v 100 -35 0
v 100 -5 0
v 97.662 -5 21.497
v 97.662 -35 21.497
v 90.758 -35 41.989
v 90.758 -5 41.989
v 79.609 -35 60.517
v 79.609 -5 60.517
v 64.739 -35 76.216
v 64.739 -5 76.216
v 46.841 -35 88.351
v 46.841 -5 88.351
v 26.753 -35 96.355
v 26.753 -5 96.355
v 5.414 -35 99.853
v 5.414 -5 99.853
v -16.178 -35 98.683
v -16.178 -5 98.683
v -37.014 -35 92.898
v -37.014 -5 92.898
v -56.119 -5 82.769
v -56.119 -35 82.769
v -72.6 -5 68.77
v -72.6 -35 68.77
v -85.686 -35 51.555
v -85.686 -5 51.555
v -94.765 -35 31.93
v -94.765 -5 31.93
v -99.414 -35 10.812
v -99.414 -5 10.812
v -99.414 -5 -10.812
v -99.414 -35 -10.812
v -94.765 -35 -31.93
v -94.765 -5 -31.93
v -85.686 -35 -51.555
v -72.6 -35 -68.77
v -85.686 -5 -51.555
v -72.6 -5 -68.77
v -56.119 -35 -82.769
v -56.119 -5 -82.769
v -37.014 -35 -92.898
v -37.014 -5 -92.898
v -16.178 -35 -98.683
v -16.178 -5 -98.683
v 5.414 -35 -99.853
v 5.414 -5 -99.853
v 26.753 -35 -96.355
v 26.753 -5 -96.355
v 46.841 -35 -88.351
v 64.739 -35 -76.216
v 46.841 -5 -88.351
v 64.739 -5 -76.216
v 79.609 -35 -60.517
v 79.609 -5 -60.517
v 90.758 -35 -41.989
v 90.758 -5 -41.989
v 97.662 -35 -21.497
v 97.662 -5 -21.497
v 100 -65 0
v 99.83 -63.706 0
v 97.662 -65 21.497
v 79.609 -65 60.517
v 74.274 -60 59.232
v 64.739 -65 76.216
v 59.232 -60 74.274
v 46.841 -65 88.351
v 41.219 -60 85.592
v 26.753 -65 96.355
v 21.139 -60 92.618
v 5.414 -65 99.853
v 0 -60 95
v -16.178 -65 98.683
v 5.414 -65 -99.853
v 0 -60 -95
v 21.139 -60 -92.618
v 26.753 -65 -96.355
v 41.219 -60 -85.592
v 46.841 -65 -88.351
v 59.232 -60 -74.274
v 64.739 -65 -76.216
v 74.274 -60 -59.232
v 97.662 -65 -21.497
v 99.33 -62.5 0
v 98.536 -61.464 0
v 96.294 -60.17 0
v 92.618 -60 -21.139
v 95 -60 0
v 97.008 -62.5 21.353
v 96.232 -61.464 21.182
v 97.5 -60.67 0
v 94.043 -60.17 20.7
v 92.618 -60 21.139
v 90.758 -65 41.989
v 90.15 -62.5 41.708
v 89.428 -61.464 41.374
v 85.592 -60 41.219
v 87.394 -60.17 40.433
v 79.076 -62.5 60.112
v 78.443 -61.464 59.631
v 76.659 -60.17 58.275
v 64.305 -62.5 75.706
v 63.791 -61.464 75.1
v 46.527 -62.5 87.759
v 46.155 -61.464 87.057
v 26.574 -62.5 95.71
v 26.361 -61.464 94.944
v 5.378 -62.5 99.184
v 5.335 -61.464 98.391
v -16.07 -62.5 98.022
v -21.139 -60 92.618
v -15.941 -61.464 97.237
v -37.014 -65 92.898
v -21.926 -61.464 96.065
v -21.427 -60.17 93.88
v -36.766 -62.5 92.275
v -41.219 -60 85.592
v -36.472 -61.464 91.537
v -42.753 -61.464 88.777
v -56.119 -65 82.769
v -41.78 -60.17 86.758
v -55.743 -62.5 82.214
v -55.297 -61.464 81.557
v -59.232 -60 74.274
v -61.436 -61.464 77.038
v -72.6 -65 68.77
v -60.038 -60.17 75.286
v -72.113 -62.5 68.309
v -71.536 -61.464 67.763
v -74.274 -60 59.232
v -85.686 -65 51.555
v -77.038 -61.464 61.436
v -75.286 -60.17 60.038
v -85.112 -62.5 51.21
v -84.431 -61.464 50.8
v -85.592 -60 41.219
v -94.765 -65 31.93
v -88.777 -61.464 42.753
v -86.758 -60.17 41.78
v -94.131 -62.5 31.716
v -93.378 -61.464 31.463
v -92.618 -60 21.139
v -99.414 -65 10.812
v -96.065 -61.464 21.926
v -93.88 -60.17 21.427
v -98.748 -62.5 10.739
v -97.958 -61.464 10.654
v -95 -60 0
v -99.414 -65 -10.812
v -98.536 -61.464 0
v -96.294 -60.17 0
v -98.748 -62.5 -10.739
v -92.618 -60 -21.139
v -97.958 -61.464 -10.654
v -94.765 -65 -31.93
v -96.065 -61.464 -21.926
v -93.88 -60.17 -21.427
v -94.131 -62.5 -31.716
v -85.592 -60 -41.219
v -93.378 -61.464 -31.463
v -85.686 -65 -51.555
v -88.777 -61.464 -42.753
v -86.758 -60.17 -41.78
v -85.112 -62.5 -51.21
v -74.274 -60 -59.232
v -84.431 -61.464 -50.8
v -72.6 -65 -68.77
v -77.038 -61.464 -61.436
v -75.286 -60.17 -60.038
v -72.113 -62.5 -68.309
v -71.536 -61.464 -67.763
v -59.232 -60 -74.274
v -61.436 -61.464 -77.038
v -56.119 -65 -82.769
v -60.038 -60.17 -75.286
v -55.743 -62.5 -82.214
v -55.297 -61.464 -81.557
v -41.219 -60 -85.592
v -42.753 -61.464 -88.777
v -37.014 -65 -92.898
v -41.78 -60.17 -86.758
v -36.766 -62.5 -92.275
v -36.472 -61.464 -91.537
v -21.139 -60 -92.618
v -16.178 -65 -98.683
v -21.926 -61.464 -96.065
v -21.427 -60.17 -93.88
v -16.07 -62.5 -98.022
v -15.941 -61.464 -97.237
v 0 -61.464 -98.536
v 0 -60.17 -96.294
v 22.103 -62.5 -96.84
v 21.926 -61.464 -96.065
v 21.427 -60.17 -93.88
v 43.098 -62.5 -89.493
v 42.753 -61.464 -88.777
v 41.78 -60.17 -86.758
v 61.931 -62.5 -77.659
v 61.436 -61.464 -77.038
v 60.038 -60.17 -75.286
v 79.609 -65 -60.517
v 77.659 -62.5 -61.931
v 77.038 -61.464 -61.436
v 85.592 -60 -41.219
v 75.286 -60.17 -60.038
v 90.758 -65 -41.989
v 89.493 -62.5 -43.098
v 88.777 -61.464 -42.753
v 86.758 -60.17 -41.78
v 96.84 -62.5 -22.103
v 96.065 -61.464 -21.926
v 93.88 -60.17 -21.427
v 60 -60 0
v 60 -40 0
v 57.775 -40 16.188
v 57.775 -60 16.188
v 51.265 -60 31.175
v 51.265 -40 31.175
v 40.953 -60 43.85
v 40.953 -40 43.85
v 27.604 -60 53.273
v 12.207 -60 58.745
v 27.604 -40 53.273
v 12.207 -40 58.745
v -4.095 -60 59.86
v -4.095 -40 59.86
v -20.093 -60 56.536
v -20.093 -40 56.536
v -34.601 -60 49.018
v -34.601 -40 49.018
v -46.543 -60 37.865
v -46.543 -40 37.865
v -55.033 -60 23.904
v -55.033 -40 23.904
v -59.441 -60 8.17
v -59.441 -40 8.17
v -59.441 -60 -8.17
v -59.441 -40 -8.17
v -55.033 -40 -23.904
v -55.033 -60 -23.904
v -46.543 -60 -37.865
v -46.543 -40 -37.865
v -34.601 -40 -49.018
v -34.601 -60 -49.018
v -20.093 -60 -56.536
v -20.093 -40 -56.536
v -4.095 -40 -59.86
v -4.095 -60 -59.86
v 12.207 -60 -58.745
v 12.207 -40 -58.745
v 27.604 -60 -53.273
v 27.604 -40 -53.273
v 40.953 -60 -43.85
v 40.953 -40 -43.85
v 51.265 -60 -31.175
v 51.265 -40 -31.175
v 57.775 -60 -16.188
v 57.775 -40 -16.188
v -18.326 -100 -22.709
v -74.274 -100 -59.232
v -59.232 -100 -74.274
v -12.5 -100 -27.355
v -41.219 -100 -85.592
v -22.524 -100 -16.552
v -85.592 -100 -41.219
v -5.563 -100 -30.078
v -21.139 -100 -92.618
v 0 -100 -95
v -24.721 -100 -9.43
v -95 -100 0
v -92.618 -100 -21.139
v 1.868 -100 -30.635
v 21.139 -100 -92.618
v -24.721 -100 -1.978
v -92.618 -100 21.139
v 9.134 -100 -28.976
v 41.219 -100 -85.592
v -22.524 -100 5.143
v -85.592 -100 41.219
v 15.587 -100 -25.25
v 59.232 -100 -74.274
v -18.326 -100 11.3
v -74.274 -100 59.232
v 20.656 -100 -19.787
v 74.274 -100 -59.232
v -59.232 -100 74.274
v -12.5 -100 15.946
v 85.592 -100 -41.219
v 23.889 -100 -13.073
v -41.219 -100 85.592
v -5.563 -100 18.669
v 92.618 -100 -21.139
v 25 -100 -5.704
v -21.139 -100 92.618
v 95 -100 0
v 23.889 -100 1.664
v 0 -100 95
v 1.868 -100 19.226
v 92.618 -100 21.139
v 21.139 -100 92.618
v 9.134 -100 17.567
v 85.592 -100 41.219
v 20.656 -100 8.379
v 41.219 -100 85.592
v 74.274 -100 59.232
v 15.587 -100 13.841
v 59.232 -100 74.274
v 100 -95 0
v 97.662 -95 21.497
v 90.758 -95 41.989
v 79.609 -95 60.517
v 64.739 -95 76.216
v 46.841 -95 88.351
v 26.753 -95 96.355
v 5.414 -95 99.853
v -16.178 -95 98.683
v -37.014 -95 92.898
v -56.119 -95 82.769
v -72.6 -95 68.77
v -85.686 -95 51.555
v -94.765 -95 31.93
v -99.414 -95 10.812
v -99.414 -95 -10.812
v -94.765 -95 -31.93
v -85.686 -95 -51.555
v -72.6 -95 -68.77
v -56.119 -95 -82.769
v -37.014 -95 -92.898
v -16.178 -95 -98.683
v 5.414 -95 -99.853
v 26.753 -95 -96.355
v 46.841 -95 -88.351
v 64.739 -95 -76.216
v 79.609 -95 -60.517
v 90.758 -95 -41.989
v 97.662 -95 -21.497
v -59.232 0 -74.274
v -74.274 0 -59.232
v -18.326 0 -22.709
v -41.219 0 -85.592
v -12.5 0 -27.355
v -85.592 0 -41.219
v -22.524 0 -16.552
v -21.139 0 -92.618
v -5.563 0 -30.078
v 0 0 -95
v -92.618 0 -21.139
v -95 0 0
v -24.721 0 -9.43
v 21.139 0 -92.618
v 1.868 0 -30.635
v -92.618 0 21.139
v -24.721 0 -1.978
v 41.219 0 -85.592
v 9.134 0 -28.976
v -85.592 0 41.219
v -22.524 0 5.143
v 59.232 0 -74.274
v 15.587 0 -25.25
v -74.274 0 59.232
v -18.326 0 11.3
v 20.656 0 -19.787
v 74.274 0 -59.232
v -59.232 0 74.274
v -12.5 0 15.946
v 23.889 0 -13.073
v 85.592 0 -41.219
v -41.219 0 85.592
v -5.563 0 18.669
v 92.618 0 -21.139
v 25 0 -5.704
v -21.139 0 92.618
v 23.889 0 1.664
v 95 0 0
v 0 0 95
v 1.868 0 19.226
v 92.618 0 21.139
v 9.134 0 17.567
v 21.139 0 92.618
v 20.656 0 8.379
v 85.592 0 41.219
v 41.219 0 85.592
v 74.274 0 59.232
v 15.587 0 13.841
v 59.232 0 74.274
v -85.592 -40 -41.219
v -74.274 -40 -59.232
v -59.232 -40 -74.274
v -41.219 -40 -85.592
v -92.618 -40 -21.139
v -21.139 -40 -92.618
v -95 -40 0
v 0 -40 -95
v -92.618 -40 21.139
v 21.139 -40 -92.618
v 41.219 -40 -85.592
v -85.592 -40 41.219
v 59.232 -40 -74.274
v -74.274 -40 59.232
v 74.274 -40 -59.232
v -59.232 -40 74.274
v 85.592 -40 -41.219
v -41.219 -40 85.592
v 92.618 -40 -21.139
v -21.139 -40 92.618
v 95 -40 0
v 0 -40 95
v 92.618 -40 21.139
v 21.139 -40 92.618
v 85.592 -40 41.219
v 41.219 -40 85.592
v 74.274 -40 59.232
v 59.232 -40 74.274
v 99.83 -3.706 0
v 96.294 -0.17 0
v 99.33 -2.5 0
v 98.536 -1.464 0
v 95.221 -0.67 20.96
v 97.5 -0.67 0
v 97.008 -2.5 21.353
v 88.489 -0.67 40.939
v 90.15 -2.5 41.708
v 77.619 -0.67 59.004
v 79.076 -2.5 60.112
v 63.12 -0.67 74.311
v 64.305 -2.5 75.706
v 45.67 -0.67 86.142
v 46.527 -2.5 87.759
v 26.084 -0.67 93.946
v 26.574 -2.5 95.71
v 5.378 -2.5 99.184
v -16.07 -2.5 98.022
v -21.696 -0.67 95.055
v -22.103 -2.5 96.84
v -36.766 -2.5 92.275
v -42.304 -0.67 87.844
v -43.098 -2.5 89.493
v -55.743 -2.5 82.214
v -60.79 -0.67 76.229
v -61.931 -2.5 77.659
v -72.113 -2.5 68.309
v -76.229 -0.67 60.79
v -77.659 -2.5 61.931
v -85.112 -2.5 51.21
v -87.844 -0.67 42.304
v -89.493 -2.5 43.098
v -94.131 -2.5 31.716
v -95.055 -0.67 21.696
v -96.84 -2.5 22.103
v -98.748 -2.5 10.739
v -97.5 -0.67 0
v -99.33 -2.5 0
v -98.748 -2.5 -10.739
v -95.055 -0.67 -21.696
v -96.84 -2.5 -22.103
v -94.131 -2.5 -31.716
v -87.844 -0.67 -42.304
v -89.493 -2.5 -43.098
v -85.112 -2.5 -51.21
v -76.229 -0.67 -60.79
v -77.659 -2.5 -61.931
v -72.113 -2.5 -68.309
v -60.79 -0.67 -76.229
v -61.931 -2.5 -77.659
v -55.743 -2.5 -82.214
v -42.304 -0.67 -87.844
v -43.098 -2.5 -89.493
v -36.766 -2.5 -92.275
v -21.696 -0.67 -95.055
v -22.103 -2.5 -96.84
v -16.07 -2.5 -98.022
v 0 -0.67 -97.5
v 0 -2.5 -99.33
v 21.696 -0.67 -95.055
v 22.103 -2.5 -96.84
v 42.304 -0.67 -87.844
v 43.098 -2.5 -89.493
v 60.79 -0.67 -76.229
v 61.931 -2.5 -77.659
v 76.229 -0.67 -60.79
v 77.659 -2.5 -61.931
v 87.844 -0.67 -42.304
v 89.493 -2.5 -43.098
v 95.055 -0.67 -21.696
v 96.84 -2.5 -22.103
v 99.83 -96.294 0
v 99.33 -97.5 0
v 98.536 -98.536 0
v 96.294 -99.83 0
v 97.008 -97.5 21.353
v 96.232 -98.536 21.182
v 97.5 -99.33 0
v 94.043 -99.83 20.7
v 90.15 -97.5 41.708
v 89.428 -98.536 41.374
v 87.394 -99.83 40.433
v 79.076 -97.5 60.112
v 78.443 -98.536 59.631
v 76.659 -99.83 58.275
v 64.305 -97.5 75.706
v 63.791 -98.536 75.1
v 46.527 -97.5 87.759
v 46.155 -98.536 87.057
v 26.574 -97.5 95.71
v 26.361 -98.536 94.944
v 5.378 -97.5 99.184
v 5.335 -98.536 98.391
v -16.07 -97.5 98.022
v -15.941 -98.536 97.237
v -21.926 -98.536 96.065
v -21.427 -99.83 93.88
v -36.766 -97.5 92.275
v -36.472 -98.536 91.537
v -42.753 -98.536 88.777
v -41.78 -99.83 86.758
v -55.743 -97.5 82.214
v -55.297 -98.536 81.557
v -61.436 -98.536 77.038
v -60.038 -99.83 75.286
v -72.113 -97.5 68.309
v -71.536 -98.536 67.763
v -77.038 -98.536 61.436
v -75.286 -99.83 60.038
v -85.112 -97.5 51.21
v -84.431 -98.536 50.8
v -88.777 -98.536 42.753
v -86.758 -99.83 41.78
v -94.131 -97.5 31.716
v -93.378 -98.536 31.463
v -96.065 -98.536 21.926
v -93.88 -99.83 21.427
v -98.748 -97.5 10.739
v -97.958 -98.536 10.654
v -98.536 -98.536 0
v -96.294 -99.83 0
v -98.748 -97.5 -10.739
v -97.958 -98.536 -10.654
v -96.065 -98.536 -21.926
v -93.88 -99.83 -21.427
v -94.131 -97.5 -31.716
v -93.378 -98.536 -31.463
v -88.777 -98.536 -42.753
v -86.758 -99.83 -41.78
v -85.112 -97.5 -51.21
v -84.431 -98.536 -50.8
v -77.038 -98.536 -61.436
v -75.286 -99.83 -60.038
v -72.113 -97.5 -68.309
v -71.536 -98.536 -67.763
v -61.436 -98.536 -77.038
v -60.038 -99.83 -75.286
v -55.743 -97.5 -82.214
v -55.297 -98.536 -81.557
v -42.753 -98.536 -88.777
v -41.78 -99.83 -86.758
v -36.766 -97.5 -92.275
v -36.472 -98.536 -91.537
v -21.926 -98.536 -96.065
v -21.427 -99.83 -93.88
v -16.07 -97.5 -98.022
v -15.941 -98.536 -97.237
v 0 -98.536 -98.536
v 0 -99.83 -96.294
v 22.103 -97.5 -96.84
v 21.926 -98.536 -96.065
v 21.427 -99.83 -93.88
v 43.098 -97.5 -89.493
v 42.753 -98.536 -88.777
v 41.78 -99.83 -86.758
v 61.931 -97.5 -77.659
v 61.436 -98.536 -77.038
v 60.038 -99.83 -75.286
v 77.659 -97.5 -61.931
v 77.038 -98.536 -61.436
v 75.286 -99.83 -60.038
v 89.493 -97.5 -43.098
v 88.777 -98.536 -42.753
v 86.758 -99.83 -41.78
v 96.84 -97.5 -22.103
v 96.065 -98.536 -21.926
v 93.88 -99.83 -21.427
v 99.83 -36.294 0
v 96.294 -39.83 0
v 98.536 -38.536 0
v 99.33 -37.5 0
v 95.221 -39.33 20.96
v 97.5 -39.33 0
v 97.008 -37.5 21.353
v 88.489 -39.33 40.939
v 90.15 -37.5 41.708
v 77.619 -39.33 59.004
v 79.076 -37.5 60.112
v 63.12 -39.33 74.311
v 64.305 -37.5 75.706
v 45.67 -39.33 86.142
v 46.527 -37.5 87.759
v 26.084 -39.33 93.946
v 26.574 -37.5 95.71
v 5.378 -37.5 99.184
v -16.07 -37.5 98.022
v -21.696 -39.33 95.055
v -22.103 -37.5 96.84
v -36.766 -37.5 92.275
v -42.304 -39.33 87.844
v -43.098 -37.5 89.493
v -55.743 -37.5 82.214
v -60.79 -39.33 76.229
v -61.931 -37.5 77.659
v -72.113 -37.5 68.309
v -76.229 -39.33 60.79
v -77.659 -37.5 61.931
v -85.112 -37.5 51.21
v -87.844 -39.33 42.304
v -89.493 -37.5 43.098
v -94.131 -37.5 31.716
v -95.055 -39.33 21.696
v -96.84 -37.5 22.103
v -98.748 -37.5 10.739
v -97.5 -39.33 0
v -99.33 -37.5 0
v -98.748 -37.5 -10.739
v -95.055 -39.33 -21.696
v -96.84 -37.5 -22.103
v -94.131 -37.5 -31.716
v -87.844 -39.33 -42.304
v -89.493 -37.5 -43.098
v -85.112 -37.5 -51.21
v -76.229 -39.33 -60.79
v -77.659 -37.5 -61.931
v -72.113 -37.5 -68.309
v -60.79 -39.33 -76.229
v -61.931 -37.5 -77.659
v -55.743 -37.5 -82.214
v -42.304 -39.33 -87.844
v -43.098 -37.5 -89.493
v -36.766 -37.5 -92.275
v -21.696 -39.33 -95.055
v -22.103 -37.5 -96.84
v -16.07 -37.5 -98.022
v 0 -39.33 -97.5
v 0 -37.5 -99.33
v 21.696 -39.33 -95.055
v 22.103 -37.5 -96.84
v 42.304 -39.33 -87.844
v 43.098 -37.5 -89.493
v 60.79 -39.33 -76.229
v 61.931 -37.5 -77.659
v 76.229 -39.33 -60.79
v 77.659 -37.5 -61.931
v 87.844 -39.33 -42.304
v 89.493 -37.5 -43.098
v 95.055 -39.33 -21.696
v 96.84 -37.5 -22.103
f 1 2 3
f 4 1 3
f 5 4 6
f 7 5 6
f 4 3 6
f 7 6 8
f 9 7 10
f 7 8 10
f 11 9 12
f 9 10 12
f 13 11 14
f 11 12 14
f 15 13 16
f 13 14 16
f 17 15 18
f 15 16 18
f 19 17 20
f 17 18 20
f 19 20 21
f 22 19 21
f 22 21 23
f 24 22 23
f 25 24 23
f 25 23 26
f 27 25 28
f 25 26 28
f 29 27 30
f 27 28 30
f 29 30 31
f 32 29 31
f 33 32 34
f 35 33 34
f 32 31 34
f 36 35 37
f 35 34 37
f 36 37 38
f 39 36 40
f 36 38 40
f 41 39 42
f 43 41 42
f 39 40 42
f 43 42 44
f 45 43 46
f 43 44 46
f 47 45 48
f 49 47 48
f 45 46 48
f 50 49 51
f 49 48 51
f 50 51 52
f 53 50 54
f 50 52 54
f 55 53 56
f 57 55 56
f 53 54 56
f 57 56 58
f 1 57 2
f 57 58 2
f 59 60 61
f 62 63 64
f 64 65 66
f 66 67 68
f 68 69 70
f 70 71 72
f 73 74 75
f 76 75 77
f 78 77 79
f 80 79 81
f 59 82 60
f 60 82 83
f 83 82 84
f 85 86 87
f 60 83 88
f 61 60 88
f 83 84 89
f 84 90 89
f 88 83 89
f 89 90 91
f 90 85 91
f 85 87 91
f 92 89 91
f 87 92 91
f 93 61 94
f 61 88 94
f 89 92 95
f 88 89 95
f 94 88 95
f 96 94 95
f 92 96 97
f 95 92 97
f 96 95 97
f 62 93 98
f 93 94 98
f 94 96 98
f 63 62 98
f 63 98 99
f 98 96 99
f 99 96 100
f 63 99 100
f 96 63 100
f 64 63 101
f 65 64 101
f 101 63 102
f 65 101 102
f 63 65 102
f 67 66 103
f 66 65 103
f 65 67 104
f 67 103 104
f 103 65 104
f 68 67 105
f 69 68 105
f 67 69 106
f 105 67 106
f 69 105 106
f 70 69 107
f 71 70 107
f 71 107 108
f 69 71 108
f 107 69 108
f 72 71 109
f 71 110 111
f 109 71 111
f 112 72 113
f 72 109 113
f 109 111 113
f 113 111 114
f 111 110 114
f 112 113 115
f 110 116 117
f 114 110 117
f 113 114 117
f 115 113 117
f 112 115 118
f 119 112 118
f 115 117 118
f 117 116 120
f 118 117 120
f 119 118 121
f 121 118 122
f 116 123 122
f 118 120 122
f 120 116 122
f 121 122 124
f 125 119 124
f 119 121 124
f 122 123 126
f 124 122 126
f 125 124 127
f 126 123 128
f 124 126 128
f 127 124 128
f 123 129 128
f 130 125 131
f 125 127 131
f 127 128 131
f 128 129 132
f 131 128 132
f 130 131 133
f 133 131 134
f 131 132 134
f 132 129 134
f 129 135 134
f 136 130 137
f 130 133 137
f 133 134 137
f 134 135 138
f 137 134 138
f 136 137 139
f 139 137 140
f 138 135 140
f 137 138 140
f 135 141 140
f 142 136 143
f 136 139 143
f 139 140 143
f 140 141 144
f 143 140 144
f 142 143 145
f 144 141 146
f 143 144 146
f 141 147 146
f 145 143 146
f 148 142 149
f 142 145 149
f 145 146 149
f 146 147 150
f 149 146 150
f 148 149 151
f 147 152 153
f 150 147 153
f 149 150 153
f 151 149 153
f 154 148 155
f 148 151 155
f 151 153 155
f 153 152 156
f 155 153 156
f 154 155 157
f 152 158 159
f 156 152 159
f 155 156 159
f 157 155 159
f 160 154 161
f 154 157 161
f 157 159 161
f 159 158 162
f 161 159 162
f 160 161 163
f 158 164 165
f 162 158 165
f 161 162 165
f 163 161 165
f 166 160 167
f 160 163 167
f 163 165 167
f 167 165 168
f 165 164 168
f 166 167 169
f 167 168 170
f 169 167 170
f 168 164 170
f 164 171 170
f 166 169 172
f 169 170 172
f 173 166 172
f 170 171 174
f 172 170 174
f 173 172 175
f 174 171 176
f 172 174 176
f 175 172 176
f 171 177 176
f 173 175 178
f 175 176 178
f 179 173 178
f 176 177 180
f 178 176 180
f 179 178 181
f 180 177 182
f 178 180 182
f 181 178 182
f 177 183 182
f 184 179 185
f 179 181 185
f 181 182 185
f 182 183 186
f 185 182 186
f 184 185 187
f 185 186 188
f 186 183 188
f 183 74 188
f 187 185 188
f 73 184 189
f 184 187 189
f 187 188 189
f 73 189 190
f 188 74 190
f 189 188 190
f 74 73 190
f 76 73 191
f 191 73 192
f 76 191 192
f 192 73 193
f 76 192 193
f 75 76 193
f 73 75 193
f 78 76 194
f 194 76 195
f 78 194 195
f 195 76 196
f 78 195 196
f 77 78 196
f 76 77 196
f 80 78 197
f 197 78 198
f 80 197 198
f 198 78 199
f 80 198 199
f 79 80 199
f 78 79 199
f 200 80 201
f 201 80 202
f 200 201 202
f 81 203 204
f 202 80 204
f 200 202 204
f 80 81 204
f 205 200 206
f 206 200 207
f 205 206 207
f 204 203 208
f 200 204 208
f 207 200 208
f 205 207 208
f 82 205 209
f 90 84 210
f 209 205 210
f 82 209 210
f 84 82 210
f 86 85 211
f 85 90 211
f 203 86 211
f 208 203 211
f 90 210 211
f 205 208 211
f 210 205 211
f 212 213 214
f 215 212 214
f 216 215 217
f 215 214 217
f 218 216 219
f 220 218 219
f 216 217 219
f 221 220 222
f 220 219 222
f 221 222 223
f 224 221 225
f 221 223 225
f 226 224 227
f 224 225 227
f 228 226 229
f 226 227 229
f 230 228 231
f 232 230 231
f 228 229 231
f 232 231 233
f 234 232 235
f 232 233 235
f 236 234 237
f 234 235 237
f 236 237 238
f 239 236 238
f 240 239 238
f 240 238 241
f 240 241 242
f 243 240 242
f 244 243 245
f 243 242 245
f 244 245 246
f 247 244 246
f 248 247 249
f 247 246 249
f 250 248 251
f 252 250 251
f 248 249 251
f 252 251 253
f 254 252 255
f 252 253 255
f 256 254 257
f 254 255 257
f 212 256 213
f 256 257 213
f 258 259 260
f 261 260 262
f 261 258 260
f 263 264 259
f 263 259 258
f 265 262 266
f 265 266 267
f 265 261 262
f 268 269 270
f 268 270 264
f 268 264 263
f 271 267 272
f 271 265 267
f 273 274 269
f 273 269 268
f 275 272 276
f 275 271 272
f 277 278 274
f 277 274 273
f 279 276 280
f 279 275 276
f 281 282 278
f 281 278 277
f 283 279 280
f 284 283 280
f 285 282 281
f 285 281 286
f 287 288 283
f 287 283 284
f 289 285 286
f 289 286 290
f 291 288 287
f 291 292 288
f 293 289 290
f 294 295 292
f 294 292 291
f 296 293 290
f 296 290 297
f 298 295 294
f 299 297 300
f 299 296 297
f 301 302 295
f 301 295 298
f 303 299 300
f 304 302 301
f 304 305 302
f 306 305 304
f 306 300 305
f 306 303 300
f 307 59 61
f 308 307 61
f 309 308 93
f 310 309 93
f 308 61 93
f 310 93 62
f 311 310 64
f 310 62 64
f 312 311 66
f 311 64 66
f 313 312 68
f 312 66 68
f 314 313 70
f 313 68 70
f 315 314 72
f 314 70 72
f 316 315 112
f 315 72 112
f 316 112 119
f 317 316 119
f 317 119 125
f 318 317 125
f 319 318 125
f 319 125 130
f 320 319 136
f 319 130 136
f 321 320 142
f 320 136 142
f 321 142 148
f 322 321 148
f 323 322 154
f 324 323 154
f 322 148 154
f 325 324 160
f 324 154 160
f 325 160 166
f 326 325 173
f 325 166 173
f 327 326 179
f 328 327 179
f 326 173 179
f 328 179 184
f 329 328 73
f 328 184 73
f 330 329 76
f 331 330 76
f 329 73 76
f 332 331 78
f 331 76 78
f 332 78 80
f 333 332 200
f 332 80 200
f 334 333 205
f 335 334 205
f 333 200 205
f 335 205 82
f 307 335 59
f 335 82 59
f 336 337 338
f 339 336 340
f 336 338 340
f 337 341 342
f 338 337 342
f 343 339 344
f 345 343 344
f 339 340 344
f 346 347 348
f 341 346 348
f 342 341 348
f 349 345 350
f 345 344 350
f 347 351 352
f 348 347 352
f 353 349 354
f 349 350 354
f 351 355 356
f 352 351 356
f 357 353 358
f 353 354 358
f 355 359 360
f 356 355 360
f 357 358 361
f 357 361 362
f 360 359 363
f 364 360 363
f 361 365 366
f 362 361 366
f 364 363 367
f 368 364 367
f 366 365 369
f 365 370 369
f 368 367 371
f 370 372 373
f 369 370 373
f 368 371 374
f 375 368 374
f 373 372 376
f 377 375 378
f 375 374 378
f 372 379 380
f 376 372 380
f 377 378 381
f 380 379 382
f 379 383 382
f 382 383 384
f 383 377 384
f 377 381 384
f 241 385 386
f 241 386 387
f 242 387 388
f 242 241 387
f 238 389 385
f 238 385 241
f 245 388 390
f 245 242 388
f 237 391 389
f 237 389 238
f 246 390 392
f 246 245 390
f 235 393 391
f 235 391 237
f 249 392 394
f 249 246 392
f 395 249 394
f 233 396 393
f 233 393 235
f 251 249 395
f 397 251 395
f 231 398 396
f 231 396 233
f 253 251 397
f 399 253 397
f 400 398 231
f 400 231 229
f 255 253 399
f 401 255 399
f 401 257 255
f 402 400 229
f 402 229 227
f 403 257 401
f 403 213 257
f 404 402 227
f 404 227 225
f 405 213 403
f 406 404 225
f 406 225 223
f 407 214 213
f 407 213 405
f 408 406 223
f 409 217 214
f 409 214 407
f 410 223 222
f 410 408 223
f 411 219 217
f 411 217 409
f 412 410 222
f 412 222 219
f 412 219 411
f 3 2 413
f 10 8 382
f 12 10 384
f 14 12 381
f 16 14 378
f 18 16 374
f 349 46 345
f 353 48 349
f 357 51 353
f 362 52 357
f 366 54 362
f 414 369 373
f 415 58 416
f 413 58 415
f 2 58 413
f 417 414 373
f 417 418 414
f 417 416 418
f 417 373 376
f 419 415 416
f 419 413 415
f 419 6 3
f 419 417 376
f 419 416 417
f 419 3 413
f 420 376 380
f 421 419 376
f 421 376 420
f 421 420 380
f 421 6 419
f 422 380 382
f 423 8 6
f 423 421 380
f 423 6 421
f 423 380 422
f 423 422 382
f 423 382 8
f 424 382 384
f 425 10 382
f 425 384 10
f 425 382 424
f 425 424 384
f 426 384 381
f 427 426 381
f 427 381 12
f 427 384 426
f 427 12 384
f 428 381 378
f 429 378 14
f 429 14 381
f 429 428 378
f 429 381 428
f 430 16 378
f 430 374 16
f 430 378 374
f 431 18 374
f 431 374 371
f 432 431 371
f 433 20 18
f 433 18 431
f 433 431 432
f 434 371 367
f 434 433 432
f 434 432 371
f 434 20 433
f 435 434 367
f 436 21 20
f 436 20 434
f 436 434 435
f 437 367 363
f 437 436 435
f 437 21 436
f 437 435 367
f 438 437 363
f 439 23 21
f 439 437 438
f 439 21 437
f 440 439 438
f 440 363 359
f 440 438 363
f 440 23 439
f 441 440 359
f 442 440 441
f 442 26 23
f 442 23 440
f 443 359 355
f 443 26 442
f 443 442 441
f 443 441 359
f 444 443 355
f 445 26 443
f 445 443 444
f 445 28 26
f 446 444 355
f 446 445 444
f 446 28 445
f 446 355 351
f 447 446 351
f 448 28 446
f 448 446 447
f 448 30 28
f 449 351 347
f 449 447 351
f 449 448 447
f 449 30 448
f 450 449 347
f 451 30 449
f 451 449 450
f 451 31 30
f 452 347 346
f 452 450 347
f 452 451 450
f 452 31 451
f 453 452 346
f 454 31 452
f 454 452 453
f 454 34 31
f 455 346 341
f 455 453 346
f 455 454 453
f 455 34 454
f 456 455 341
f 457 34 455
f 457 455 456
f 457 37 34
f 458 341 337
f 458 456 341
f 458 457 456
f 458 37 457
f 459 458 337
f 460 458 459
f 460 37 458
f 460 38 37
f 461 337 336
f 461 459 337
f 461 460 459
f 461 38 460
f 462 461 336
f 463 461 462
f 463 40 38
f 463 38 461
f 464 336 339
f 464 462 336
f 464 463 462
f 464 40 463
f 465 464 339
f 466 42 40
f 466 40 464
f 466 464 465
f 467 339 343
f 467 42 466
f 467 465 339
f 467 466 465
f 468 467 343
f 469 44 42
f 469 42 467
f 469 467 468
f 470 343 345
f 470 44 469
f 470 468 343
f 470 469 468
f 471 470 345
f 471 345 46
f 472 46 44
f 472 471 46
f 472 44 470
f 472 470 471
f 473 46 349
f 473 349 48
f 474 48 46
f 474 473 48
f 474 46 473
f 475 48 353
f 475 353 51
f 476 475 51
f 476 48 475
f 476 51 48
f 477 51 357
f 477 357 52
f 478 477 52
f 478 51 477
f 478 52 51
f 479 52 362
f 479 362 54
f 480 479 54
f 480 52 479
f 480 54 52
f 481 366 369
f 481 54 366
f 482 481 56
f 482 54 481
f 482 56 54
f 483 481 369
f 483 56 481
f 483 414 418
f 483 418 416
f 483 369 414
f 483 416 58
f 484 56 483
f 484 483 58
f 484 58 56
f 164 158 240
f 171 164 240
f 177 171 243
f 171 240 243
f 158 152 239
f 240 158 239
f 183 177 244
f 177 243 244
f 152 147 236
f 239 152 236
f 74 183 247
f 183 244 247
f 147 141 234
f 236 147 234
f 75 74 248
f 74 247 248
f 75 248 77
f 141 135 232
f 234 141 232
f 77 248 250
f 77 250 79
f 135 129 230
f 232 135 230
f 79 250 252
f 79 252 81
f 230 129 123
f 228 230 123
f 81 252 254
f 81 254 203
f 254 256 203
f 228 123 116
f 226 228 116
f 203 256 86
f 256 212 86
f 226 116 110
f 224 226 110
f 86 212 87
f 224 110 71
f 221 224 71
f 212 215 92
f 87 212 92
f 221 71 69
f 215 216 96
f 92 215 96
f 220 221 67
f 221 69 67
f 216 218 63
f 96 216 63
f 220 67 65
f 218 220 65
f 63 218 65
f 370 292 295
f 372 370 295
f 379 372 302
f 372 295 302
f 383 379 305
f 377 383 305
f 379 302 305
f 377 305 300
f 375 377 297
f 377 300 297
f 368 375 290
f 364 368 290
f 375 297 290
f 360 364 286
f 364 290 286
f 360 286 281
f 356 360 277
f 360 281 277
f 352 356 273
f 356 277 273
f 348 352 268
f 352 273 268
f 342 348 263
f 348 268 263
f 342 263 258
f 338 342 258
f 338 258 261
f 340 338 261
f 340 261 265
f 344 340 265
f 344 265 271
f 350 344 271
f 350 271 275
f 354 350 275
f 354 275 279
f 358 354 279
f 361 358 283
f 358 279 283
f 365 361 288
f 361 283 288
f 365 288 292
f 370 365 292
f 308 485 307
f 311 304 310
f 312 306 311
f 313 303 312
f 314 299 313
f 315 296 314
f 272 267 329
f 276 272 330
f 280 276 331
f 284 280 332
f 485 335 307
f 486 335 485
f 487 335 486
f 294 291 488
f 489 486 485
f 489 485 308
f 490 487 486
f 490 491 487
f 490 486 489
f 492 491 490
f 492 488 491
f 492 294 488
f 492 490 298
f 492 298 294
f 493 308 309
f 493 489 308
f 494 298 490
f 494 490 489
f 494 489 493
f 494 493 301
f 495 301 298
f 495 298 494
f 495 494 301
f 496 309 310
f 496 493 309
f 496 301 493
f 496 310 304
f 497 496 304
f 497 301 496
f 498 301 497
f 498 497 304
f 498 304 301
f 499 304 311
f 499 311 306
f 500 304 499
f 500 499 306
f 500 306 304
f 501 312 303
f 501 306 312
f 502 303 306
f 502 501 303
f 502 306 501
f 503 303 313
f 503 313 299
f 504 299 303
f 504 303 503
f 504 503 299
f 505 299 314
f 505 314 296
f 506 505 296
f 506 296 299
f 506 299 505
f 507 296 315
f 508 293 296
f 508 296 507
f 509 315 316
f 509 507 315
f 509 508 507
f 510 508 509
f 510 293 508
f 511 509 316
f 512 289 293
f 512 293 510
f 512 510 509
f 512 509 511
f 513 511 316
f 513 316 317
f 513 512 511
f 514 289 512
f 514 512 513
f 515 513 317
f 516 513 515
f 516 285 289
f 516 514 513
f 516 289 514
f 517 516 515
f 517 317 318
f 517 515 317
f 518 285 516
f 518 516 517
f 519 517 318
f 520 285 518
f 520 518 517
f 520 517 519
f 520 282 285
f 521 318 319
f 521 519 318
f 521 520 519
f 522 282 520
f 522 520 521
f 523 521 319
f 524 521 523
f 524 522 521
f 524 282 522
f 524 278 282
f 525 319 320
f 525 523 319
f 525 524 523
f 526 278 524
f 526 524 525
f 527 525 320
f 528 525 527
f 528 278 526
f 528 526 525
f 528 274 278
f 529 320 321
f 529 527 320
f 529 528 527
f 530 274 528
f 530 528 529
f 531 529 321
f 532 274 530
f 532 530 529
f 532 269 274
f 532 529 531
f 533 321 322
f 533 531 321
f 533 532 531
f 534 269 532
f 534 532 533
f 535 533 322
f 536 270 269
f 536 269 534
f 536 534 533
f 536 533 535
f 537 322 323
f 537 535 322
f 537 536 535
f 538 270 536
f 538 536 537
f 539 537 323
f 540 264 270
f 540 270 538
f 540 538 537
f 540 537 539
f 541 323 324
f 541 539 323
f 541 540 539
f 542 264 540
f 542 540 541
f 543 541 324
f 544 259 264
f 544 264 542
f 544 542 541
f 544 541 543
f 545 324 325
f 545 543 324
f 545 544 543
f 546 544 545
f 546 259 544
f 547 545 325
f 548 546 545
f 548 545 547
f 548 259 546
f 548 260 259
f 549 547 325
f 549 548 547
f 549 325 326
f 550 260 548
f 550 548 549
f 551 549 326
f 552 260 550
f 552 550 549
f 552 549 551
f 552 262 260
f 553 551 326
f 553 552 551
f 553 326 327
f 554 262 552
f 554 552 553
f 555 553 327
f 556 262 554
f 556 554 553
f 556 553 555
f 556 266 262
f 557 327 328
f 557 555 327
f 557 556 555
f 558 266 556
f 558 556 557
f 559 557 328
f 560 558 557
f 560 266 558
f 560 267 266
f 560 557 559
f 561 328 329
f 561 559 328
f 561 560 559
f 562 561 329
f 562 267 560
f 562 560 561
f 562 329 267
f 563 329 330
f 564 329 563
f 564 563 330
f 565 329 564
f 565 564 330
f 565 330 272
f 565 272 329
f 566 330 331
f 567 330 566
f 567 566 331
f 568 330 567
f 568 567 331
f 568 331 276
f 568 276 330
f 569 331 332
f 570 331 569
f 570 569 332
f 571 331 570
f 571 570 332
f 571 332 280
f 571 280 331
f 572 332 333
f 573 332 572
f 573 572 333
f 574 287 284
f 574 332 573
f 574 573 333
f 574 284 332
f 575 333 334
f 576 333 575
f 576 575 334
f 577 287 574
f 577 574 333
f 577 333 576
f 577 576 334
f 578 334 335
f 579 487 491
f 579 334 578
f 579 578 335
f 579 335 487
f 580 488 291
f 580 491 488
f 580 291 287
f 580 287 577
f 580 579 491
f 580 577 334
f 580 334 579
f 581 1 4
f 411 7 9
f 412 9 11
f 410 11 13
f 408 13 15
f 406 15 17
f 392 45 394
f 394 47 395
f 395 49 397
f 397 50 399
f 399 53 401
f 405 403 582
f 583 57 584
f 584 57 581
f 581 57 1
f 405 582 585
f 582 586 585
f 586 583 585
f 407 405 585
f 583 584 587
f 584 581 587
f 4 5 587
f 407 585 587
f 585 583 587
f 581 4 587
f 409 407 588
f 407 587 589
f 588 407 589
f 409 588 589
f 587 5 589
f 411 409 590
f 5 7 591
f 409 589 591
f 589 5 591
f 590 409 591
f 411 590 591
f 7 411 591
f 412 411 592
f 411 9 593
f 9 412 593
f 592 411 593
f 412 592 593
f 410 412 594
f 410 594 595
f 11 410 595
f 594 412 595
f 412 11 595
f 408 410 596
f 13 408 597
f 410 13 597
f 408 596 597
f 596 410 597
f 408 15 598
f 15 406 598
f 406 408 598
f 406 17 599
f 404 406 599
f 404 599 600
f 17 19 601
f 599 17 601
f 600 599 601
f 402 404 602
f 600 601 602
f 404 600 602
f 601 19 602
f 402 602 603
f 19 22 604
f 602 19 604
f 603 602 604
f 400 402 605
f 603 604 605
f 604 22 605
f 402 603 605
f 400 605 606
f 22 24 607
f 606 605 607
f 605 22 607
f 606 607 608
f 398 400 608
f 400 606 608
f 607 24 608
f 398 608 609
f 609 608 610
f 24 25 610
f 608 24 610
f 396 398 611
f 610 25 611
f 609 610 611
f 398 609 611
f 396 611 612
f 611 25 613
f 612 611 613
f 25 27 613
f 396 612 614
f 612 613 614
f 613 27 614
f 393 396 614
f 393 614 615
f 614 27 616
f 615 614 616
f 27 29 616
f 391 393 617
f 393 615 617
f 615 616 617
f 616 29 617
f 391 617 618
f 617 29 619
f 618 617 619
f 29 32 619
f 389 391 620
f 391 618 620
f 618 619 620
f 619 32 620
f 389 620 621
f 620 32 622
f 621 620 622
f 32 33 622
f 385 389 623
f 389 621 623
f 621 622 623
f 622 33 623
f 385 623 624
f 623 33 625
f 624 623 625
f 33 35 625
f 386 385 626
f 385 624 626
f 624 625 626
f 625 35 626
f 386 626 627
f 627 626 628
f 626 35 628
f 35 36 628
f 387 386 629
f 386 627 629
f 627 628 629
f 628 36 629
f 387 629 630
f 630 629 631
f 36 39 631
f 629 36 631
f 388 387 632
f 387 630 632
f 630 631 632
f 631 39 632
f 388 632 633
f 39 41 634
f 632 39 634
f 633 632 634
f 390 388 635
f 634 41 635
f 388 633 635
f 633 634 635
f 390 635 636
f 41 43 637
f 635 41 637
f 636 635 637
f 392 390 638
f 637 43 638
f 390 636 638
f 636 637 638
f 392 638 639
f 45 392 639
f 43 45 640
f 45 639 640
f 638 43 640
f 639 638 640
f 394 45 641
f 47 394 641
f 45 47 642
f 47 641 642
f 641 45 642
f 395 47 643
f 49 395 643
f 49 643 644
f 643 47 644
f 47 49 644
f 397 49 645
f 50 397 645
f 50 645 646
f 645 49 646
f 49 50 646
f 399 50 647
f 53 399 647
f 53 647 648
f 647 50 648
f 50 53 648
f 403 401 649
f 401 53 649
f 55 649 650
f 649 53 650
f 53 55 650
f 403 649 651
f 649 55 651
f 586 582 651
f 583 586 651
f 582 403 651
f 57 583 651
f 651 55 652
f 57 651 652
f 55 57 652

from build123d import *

# Parameters (mm, degrees)
F0_R     = 100
F1_DEPTH = 40
F2_R     = 60
F3_DEPTH = 20
F4_R     = 100
F5_DEPTH = 40
F6_R     = 25
F7_DEPTH = 100
F8_R     = 5


with BuildPart() as f1:
    # F0 (on Front) → F1 (new body)
    with BuildSketch(Plane.XZ):
        Circle(F0_R)
    extrude(amount=F1_DEPTH)

    # F2 (on face) → F3 (join)
    with BuildSketch(Plane.XZ.offset(40)):
        Circle(F2_R)
    extrude(amount=F3_DEPTH)

    # F4 (on face) → F5 (join)
    with BuildSketch(Plane.XZ.offset(60)):
        Circle(F4_R)
    extrude(amount=F5_DEPTH)

    # F6 (on face) → F7 (cut)
    with BuildSketch(Plane.XZ.offset(100)):
        with Locations((0, -5.704428)):
            Circle(F6_R)
    extrude(amount=-F7_DEPTH, mode=Mode.SUBTRACT)

    # F8
    f8_edges = [f1.edges().sort_by_distance(p)[0] for p in [
        (-100, -100, 0),
        (-100, -60, 0),
        (-100, -40, 0),
        (-100, 0, 0),
    ]]
    fillet(f8_edges, radius=F8_R)


solid = f1.part
